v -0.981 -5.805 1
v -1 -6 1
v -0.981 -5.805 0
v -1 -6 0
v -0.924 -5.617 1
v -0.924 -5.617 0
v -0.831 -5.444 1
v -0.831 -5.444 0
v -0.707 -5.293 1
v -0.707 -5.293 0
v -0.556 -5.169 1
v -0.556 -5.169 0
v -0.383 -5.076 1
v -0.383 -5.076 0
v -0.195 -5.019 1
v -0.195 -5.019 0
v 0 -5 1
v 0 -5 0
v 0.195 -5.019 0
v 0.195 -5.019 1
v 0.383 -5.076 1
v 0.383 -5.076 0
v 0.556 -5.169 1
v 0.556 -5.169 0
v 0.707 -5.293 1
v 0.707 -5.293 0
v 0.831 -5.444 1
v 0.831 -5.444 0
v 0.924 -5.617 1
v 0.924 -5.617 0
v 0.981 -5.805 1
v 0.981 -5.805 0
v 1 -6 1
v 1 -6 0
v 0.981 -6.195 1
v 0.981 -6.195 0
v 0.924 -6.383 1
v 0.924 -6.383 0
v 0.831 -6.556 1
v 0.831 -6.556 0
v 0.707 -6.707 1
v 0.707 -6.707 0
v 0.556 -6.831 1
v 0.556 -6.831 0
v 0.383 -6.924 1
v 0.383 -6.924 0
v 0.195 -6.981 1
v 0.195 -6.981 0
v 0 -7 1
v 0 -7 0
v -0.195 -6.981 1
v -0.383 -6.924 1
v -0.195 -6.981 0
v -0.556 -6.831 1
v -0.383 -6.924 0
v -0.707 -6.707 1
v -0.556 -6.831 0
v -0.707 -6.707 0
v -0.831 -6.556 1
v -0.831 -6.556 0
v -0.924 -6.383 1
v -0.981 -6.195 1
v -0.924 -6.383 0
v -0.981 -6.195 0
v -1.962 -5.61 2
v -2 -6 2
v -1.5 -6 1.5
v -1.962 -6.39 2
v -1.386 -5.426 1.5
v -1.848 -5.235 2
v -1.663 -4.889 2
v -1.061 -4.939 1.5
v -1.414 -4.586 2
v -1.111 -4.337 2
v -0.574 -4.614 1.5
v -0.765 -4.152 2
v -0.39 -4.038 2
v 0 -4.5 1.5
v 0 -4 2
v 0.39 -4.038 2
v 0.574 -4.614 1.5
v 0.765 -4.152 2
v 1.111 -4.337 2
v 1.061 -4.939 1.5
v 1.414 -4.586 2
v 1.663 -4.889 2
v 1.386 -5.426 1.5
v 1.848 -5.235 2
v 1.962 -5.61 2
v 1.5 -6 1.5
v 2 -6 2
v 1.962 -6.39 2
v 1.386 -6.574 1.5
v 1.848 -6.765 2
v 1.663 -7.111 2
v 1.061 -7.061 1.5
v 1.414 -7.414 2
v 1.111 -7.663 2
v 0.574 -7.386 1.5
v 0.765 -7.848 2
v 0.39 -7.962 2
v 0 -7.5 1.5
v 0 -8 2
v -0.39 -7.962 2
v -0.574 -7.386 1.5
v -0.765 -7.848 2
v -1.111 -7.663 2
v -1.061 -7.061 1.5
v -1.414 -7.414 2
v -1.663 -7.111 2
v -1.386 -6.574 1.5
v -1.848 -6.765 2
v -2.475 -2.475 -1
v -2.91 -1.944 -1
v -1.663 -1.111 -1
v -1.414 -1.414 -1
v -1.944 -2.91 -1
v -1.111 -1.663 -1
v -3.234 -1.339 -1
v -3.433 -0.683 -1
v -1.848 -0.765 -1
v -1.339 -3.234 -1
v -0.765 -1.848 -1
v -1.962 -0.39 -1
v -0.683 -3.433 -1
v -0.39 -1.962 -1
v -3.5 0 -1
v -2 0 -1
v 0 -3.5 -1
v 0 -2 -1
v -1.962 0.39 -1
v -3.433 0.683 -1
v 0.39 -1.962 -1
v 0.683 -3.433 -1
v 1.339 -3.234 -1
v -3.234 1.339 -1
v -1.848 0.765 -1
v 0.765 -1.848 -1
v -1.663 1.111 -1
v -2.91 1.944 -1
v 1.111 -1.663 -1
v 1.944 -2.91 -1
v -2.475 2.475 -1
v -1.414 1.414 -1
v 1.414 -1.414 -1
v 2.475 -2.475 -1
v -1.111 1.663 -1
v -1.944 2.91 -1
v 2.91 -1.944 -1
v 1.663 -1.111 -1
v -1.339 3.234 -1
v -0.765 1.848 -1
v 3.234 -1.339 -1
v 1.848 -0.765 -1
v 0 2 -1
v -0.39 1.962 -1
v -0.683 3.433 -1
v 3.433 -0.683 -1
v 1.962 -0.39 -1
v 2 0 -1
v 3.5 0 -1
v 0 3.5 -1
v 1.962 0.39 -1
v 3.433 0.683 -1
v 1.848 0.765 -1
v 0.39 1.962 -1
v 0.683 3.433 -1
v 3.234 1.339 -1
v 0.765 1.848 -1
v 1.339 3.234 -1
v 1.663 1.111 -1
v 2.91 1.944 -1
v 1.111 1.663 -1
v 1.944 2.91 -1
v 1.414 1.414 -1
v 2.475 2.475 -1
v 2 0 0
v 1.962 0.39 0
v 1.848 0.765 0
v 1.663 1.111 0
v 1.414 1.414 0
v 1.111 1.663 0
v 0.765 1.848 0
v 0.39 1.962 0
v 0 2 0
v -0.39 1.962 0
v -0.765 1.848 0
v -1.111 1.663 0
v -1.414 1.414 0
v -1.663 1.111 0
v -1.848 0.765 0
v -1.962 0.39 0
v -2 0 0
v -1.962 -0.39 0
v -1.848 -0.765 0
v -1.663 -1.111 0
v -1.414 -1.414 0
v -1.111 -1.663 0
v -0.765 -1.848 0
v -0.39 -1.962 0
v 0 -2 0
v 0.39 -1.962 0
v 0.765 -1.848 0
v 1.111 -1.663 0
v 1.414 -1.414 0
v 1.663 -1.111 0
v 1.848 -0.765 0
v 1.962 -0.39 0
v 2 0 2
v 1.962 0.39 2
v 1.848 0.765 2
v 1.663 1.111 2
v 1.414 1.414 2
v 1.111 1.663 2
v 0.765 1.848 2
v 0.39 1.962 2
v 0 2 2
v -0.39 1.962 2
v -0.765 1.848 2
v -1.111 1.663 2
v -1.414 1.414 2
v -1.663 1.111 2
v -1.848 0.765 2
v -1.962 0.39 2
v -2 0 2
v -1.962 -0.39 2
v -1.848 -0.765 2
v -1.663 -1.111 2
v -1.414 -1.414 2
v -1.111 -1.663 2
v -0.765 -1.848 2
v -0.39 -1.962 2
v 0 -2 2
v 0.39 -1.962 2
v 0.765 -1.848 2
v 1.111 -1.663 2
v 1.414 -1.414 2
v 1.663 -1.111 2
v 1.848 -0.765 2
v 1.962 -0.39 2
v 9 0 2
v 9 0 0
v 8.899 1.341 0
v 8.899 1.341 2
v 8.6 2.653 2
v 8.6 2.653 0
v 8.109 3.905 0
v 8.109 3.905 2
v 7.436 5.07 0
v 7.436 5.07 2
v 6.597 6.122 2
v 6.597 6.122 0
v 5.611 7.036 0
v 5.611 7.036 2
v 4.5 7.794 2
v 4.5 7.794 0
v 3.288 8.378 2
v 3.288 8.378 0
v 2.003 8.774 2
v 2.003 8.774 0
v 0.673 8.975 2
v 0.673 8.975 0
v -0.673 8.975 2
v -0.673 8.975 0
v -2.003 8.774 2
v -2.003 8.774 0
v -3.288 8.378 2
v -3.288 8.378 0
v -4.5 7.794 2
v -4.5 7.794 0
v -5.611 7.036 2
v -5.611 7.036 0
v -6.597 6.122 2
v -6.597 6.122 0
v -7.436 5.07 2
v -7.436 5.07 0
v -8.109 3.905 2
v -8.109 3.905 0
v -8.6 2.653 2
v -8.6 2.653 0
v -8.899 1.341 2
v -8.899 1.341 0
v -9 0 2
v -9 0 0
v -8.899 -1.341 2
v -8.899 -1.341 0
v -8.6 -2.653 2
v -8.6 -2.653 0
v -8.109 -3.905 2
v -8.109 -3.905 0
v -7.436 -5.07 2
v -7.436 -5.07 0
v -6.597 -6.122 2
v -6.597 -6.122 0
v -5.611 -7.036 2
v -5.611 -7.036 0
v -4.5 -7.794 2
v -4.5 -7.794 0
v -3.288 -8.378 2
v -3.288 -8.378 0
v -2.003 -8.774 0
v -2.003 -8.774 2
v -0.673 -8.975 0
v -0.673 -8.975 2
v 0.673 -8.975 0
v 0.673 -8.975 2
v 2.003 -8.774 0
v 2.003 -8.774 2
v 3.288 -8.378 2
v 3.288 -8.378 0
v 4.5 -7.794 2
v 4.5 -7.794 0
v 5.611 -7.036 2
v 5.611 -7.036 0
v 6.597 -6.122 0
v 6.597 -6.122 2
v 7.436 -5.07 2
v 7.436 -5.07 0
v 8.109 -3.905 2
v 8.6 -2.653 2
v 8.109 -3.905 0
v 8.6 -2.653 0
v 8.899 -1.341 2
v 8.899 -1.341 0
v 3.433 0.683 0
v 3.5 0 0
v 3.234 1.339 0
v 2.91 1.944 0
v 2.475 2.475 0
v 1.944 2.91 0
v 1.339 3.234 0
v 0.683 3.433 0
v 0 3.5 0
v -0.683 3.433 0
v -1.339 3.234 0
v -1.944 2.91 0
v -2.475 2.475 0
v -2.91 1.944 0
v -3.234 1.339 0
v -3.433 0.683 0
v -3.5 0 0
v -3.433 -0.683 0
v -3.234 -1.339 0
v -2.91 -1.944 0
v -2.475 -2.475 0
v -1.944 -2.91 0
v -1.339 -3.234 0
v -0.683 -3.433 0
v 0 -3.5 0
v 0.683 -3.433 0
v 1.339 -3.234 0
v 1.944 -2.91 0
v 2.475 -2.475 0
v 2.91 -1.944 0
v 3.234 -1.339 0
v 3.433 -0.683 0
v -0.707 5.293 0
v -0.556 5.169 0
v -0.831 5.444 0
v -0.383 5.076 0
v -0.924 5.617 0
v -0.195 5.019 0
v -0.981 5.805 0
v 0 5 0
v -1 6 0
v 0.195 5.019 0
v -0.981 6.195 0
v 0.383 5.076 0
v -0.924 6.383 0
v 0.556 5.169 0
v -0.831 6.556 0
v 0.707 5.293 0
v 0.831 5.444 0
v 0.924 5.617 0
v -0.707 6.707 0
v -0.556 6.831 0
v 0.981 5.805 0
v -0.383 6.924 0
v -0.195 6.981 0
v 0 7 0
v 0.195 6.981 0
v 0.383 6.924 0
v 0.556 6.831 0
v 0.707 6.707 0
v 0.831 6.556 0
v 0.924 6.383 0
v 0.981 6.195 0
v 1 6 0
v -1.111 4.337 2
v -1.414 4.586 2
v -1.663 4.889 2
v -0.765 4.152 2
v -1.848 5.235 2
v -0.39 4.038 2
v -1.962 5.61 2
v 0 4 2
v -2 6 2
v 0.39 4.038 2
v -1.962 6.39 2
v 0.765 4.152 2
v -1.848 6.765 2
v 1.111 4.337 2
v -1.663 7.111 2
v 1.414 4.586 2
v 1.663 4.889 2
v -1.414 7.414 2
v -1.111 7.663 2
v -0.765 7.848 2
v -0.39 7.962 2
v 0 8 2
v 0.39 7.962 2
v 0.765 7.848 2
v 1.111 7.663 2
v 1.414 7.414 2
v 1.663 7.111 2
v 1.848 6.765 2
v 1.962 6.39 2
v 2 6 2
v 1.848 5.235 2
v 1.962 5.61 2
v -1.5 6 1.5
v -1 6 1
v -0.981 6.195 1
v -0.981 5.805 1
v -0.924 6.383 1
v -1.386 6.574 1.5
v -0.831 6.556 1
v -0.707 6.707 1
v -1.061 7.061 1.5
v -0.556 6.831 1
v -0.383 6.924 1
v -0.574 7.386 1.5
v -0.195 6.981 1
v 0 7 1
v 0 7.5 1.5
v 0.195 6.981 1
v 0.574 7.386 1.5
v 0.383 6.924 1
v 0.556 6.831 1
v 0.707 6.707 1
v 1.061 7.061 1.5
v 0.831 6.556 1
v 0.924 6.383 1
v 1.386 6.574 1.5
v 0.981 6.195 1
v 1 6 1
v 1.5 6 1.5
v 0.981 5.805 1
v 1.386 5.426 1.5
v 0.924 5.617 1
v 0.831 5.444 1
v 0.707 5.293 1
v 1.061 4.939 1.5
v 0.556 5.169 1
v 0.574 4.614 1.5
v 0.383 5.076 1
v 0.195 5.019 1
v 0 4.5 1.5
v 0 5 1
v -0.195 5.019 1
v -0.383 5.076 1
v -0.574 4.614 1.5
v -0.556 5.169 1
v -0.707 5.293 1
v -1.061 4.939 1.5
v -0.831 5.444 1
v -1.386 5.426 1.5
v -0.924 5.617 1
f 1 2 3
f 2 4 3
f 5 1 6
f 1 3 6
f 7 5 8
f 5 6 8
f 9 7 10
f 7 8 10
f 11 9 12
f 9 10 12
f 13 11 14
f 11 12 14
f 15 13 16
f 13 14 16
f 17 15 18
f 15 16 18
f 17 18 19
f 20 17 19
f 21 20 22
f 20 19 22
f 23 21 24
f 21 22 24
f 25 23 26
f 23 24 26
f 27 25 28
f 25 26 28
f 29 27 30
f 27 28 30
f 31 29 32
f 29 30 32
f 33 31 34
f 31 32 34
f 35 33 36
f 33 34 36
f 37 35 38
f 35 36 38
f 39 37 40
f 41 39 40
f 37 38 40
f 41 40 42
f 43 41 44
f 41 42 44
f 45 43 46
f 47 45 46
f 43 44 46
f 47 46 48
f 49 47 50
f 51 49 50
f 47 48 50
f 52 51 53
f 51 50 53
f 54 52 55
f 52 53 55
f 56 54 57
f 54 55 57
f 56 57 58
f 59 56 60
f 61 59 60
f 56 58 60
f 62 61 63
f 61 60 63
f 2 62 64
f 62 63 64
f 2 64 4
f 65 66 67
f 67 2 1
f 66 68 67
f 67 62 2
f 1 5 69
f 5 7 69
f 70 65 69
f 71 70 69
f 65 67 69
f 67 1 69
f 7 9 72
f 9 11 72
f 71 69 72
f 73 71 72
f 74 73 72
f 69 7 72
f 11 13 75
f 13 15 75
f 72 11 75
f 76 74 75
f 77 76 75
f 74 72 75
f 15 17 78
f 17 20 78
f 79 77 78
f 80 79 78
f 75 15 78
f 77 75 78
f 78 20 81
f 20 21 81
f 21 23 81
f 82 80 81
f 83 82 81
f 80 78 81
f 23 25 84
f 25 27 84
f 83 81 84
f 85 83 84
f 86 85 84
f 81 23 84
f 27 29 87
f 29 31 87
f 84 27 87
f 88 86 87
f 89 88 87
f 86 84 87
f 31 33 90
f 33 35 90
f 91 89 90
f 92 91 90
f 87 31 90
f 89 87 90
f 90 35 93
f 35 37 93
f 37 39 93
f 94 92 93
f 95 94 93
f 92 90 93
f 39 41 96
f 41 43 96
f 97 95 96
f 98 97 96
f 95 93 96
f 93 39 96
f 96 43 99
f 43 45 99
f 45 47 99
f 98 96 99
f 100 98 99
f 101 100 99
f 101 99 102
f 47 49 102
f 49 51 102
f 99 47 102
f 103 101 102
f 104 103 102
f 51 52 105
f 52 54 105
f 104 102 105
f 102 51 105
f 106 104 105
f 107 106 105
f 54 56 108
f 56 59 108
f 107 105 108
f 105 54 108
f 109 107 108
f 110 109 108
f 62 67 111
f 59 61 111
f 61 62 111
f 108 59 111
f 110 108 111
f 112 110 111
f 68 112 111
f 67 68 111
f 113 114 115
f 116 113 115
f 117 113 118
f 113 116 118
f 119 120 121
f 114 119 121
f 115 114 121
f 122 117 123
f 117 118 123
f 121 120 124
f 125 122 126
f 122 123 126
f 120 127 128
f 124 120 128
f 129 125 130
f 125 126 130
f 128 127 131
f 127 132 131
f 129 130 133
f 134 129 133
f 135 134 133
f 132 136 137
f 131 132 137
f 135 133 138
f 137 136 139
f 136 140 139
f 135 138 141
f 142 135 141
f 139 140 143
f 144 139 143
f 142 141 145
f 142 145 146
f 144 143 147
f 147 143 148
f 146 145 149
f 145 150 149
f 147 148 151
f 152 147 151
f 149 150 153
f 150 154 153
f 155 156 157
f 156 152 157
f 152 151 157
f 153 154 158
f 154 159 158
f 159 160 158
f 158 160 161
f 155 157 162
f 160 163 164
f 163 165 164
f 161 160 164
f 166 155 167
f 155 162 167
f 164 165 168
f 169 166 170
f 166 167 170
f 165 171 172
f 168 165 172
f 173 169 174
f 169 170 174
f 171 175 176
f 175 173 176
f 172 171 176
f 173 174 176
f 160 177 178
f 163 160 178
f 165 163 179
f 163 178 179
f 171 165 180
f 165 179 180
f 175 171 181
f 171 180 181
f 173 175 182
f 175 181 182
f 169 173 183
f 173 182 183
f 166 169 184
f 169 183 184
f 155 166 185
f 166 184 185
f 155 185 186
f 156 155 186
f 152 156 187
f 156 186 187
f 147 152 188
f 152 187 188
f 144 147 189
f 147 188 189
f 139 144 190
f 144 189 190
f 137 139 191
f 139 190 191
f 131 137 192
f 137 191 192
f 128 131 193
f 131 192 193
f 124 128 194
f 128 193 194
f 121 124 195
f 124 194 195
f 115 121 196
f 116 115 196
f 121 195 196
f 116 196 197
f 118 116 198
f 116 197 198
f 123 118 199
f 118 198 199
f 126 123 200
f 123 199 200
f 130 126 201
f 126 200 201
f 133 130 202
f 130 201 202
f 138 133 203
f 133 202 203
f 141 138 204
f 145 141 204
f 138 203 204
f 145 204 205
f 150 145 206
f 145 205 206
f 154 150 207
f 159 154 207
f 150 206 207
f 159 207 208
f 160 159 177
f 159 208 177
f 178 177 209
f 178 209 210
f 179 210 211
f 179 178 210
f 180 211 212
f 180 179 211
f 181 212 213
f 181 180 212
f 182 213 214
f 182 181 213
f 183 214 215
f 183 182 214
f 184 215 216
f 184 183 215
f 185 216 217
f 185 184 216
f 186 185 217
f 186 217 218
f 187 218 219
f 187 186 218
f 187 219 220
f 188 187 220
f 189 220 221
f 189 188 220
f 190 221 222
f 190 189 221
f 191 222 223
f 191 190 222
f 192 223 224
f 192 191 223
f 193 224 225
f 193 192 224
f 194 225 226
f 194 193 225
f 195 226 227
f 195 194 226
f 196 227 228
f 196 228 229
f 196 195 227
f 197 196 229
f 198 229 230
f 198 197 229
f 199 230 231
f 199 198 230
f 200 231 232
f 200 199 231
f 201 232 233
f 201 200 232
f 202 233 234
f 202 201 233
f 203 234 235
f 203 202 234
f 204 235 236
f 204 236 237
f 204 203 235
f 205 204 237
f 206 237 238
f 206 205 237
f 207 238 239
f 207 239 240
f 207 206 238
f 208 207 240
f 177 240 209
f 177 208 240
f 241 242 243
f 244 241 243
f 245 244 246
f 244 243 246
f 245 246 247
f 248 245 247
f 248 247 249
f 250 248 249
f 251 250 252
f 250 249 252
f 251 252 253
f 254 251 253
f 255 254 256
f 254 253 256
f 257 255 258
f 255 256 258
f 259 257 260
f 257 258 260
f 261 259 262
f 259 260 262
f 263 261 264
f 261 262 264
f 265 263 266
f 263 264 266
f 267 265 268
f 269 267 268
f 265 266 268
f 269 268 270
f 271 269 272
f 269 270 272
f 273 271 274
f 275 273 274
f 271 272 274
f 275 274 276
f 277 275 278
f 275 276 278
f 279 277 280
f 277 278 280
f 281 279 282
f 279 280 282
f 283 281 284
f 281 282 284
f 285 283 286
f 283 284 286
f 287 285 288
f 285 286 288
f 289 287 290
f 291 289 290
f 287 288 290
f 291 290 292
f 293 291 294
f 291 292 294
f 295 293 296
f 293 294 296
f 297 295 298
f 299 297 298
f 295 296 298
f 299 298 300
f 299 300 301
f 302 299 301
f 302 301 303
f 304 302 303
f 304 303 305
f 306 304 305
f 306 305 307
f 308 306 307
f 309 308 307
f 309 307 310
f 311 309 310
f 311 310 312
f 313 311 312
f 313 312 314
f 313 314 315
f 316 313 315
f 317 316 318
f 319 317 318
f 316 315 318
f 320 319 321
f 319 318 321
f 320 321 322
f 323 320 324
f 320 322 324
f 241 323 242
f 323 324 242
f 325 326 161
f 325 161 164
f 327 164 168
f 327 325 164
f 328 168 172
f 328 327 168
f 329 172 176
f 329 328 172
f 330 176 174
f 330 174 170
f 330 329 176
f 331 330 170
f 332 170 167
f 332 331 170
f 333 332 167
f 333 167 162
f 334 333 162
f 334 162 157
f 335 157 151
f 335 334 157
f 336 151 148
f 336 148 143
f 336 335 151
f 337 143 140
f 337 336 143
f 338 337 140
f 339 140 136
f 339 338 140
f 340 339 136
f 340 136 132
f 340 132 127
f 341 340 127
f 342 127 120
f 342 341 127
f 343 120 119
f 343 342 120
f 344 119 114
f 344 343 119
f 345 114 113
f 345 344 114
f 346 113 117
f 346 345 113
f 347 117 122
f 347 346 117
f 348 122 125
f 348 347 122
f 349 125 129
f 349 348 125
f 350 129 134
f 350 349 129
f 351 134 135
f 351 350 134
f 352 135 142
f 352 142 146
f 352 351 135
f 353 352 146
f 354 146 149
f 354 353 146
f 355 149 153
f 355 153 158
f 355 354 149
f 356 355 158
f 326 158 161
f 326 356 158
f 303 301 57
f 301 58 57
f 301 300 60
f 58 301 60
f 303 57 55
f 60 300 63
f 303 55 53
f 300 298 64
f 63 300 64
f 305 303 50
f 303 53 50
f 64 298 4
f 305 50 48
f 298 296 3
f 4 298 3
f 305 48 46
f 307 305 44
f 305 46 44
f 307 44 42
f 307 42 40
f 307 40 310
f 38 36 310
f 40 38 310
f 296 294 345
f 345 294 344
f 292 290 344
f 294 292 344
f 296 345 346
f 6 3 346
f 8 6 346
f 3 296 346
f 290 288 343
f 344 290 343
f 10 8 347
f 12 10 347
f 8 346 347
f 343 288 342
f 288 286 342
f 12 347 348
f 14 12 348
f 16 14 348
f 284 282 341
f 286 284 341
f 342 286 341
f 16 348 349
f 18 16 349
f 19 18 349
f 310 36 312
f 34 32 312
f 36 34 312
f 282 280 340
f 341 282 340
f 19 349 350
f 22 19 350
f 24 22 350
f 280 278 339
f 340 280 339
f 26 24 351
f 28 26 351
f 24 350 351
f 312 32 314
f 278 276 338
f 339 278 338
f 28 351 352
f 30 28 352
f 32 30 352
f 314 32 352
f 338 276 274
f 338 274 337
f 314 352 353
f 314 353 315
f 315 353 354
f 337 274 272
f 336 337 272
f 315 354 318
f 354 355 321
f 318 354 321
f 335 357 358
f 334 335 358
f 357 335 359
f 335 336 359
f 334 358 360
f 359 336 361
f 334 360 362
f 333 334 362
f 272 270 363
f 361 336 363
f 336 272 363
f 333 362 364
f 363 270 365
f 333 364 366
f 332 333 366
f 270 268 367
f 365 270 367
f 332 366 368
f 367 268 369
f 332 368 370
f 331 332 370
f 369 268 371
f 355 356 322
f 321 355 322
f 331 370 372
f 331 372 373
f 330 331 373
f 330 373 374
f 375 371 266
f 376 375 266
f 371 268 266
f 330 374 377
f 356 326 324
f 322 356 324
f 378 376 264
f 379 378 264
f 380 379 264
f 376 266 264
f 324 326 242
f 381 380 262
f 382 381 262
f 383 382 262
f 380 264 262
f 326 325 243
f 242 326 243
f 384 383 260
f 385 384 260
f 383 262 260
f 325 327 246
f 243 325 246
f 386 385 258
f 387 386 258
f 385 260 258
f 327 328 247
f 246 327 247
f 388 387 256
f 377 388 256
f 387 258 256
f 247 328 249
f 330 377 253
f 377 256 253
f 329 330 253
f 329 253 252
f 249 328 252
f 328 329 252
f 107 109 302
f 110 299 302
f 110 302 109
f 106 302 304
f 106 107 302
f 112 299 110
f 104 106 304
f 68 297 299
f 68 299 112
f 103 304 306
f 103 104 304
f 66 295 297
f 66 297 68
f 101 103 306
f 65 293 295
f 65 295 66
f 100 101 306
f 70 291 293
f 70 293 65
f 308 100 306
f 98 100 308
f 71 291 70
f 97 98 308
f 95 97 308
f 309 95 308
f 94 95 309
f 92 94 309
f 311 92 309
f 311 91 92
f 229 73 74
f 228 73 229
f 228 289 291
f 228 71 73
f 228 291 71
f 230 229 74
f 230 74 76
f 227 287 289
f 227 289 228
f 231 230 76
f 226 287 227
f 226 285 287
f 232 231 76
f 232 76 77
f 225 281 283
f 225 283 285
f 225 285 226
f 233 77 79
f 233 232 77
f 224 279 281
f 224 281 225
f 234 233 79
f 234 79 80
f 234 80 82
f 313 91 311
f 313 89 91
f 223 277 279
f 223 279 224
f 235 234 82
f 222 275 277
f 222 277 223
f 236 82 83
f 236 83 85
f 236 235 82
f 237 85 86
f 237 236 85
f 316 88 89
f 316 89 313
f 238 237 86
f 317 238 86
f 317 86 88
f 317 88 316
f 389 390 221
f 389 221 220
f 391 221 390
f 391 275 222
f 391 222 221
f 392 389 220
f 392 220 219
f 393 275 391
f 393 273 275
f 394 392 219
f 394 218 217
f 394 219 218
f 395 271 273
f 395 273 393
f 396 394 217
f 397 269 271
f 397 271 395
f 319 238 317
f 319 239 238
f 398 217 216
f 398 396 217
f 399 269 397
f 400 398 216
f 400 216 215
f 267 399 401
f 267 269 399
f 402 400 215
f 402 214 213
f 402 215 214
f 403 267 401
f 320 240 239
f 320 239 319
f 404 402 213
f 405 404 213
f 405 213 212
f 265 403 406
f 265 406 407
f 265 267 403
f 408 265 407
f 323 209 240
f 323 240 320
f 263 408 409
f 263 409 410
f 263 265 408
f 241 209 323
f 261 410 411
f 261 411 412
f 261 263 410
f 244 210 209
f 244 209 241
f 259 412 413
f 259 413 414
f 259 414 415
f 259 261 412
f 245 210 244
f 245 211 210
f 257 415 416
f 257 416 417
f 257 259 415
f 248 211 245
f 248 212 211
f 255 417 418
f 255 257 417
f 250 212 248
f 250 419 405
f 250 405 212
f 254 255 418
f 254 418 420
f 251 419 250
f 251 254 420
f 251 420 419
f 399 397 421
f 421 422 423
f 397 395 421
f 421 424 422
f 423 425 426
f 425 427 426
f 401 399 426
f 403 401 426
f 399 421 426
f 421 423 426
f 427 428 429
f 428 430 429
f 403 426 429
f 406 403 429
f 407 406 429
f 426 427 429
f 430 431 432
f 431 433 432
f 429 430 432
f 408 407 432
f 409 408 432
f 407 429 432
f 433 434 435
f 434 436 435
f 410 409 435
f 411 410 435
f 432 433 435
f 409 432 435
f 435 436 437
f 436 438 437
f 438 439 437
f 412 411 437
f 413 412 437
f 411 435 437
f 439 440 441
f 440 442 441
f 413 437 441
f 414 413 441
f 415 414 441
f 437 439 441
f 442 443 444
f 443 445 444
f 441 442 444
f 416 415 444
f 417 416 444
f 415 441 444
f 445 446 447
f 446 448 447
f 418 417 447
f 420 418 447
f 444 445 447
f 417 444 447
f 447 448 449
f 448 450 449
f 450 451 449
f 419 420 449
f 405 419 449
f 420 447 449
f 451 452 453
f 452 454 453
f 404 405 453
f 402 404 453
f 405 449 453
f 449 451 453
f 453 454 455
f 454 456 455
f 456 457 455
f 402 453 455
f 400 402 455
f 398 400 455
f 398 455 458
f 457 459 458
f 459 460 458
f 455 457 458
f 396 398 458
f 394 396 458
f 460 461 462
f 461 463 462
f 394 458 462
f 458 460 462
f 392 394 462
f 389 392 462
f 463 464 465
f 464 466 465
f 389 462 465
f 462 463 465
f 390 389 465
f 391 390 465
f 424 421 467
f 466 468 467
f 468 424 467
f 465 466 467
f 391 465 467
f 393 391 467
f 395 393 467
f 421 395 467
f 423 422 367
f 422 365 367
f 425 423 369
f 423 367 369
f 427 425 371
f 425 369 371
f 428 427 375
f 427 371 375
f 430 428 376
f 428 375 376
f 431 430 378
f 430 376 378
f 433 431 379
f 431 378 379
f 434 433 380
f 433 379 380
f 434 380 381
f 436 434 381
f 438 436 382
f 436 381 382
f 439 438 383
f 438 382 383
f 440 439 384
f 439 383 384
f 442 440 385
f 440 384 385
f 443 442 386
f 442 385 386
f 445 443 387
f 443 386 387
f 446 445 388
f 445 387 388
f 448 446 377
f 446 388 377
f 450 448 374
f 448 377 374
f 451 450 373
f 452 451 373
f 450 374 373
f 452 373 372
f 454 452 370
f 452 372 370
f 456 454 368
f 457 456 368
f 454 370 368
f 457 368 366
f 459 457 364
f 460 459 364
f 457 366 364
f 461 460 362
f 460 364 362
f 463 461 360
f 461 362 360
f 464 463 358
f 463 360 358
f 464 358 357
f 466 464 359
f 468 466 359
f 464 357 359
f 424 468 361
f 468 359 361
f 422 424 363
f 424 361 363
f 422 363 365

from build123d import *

# Parameters (mm, degrees)
F0_R           = 9
F0_R_2         = 3.5
F0_R_3         = 2
F1_DEPTH       = 2
F2_DEPTH       = 1
F4_D           = 2
F4_CSINK_D     = 4
F4_CSINK_ANGLE = 90


with BuildPart() as f1:
    # F0 (on Top) → F1 (new body)
    with BuildSketch(Plane.XY):
        Circle(F0_R)
        Circle(F0_R_2, mode=Mode.SUBTRACT)
        Circle(F0_R_2)
        Circle(F0_R_3, mode=Mode.SUBTRACT)
    extrude(amount=F1_DEPTH)

    # F0 (on Top) → F2 (join)
    with BuildSketch(Plane.XY):
        Circle(F0_R_2)
        Circle(F0_R_3, mode=Mode.SUBTRACT)
    extrude(amount=-F2_DEPTH)

    # F4 (through all)
    with Locations(Plane.XY.offset(2)):
        with Locations((0, 6), (0, -6)):
            CounterSinkHole(F4_D / 2, F4_CSINK_D / 2, counter_sink_angle=F4_CSINK_ANGLE)


solid = f1.part
